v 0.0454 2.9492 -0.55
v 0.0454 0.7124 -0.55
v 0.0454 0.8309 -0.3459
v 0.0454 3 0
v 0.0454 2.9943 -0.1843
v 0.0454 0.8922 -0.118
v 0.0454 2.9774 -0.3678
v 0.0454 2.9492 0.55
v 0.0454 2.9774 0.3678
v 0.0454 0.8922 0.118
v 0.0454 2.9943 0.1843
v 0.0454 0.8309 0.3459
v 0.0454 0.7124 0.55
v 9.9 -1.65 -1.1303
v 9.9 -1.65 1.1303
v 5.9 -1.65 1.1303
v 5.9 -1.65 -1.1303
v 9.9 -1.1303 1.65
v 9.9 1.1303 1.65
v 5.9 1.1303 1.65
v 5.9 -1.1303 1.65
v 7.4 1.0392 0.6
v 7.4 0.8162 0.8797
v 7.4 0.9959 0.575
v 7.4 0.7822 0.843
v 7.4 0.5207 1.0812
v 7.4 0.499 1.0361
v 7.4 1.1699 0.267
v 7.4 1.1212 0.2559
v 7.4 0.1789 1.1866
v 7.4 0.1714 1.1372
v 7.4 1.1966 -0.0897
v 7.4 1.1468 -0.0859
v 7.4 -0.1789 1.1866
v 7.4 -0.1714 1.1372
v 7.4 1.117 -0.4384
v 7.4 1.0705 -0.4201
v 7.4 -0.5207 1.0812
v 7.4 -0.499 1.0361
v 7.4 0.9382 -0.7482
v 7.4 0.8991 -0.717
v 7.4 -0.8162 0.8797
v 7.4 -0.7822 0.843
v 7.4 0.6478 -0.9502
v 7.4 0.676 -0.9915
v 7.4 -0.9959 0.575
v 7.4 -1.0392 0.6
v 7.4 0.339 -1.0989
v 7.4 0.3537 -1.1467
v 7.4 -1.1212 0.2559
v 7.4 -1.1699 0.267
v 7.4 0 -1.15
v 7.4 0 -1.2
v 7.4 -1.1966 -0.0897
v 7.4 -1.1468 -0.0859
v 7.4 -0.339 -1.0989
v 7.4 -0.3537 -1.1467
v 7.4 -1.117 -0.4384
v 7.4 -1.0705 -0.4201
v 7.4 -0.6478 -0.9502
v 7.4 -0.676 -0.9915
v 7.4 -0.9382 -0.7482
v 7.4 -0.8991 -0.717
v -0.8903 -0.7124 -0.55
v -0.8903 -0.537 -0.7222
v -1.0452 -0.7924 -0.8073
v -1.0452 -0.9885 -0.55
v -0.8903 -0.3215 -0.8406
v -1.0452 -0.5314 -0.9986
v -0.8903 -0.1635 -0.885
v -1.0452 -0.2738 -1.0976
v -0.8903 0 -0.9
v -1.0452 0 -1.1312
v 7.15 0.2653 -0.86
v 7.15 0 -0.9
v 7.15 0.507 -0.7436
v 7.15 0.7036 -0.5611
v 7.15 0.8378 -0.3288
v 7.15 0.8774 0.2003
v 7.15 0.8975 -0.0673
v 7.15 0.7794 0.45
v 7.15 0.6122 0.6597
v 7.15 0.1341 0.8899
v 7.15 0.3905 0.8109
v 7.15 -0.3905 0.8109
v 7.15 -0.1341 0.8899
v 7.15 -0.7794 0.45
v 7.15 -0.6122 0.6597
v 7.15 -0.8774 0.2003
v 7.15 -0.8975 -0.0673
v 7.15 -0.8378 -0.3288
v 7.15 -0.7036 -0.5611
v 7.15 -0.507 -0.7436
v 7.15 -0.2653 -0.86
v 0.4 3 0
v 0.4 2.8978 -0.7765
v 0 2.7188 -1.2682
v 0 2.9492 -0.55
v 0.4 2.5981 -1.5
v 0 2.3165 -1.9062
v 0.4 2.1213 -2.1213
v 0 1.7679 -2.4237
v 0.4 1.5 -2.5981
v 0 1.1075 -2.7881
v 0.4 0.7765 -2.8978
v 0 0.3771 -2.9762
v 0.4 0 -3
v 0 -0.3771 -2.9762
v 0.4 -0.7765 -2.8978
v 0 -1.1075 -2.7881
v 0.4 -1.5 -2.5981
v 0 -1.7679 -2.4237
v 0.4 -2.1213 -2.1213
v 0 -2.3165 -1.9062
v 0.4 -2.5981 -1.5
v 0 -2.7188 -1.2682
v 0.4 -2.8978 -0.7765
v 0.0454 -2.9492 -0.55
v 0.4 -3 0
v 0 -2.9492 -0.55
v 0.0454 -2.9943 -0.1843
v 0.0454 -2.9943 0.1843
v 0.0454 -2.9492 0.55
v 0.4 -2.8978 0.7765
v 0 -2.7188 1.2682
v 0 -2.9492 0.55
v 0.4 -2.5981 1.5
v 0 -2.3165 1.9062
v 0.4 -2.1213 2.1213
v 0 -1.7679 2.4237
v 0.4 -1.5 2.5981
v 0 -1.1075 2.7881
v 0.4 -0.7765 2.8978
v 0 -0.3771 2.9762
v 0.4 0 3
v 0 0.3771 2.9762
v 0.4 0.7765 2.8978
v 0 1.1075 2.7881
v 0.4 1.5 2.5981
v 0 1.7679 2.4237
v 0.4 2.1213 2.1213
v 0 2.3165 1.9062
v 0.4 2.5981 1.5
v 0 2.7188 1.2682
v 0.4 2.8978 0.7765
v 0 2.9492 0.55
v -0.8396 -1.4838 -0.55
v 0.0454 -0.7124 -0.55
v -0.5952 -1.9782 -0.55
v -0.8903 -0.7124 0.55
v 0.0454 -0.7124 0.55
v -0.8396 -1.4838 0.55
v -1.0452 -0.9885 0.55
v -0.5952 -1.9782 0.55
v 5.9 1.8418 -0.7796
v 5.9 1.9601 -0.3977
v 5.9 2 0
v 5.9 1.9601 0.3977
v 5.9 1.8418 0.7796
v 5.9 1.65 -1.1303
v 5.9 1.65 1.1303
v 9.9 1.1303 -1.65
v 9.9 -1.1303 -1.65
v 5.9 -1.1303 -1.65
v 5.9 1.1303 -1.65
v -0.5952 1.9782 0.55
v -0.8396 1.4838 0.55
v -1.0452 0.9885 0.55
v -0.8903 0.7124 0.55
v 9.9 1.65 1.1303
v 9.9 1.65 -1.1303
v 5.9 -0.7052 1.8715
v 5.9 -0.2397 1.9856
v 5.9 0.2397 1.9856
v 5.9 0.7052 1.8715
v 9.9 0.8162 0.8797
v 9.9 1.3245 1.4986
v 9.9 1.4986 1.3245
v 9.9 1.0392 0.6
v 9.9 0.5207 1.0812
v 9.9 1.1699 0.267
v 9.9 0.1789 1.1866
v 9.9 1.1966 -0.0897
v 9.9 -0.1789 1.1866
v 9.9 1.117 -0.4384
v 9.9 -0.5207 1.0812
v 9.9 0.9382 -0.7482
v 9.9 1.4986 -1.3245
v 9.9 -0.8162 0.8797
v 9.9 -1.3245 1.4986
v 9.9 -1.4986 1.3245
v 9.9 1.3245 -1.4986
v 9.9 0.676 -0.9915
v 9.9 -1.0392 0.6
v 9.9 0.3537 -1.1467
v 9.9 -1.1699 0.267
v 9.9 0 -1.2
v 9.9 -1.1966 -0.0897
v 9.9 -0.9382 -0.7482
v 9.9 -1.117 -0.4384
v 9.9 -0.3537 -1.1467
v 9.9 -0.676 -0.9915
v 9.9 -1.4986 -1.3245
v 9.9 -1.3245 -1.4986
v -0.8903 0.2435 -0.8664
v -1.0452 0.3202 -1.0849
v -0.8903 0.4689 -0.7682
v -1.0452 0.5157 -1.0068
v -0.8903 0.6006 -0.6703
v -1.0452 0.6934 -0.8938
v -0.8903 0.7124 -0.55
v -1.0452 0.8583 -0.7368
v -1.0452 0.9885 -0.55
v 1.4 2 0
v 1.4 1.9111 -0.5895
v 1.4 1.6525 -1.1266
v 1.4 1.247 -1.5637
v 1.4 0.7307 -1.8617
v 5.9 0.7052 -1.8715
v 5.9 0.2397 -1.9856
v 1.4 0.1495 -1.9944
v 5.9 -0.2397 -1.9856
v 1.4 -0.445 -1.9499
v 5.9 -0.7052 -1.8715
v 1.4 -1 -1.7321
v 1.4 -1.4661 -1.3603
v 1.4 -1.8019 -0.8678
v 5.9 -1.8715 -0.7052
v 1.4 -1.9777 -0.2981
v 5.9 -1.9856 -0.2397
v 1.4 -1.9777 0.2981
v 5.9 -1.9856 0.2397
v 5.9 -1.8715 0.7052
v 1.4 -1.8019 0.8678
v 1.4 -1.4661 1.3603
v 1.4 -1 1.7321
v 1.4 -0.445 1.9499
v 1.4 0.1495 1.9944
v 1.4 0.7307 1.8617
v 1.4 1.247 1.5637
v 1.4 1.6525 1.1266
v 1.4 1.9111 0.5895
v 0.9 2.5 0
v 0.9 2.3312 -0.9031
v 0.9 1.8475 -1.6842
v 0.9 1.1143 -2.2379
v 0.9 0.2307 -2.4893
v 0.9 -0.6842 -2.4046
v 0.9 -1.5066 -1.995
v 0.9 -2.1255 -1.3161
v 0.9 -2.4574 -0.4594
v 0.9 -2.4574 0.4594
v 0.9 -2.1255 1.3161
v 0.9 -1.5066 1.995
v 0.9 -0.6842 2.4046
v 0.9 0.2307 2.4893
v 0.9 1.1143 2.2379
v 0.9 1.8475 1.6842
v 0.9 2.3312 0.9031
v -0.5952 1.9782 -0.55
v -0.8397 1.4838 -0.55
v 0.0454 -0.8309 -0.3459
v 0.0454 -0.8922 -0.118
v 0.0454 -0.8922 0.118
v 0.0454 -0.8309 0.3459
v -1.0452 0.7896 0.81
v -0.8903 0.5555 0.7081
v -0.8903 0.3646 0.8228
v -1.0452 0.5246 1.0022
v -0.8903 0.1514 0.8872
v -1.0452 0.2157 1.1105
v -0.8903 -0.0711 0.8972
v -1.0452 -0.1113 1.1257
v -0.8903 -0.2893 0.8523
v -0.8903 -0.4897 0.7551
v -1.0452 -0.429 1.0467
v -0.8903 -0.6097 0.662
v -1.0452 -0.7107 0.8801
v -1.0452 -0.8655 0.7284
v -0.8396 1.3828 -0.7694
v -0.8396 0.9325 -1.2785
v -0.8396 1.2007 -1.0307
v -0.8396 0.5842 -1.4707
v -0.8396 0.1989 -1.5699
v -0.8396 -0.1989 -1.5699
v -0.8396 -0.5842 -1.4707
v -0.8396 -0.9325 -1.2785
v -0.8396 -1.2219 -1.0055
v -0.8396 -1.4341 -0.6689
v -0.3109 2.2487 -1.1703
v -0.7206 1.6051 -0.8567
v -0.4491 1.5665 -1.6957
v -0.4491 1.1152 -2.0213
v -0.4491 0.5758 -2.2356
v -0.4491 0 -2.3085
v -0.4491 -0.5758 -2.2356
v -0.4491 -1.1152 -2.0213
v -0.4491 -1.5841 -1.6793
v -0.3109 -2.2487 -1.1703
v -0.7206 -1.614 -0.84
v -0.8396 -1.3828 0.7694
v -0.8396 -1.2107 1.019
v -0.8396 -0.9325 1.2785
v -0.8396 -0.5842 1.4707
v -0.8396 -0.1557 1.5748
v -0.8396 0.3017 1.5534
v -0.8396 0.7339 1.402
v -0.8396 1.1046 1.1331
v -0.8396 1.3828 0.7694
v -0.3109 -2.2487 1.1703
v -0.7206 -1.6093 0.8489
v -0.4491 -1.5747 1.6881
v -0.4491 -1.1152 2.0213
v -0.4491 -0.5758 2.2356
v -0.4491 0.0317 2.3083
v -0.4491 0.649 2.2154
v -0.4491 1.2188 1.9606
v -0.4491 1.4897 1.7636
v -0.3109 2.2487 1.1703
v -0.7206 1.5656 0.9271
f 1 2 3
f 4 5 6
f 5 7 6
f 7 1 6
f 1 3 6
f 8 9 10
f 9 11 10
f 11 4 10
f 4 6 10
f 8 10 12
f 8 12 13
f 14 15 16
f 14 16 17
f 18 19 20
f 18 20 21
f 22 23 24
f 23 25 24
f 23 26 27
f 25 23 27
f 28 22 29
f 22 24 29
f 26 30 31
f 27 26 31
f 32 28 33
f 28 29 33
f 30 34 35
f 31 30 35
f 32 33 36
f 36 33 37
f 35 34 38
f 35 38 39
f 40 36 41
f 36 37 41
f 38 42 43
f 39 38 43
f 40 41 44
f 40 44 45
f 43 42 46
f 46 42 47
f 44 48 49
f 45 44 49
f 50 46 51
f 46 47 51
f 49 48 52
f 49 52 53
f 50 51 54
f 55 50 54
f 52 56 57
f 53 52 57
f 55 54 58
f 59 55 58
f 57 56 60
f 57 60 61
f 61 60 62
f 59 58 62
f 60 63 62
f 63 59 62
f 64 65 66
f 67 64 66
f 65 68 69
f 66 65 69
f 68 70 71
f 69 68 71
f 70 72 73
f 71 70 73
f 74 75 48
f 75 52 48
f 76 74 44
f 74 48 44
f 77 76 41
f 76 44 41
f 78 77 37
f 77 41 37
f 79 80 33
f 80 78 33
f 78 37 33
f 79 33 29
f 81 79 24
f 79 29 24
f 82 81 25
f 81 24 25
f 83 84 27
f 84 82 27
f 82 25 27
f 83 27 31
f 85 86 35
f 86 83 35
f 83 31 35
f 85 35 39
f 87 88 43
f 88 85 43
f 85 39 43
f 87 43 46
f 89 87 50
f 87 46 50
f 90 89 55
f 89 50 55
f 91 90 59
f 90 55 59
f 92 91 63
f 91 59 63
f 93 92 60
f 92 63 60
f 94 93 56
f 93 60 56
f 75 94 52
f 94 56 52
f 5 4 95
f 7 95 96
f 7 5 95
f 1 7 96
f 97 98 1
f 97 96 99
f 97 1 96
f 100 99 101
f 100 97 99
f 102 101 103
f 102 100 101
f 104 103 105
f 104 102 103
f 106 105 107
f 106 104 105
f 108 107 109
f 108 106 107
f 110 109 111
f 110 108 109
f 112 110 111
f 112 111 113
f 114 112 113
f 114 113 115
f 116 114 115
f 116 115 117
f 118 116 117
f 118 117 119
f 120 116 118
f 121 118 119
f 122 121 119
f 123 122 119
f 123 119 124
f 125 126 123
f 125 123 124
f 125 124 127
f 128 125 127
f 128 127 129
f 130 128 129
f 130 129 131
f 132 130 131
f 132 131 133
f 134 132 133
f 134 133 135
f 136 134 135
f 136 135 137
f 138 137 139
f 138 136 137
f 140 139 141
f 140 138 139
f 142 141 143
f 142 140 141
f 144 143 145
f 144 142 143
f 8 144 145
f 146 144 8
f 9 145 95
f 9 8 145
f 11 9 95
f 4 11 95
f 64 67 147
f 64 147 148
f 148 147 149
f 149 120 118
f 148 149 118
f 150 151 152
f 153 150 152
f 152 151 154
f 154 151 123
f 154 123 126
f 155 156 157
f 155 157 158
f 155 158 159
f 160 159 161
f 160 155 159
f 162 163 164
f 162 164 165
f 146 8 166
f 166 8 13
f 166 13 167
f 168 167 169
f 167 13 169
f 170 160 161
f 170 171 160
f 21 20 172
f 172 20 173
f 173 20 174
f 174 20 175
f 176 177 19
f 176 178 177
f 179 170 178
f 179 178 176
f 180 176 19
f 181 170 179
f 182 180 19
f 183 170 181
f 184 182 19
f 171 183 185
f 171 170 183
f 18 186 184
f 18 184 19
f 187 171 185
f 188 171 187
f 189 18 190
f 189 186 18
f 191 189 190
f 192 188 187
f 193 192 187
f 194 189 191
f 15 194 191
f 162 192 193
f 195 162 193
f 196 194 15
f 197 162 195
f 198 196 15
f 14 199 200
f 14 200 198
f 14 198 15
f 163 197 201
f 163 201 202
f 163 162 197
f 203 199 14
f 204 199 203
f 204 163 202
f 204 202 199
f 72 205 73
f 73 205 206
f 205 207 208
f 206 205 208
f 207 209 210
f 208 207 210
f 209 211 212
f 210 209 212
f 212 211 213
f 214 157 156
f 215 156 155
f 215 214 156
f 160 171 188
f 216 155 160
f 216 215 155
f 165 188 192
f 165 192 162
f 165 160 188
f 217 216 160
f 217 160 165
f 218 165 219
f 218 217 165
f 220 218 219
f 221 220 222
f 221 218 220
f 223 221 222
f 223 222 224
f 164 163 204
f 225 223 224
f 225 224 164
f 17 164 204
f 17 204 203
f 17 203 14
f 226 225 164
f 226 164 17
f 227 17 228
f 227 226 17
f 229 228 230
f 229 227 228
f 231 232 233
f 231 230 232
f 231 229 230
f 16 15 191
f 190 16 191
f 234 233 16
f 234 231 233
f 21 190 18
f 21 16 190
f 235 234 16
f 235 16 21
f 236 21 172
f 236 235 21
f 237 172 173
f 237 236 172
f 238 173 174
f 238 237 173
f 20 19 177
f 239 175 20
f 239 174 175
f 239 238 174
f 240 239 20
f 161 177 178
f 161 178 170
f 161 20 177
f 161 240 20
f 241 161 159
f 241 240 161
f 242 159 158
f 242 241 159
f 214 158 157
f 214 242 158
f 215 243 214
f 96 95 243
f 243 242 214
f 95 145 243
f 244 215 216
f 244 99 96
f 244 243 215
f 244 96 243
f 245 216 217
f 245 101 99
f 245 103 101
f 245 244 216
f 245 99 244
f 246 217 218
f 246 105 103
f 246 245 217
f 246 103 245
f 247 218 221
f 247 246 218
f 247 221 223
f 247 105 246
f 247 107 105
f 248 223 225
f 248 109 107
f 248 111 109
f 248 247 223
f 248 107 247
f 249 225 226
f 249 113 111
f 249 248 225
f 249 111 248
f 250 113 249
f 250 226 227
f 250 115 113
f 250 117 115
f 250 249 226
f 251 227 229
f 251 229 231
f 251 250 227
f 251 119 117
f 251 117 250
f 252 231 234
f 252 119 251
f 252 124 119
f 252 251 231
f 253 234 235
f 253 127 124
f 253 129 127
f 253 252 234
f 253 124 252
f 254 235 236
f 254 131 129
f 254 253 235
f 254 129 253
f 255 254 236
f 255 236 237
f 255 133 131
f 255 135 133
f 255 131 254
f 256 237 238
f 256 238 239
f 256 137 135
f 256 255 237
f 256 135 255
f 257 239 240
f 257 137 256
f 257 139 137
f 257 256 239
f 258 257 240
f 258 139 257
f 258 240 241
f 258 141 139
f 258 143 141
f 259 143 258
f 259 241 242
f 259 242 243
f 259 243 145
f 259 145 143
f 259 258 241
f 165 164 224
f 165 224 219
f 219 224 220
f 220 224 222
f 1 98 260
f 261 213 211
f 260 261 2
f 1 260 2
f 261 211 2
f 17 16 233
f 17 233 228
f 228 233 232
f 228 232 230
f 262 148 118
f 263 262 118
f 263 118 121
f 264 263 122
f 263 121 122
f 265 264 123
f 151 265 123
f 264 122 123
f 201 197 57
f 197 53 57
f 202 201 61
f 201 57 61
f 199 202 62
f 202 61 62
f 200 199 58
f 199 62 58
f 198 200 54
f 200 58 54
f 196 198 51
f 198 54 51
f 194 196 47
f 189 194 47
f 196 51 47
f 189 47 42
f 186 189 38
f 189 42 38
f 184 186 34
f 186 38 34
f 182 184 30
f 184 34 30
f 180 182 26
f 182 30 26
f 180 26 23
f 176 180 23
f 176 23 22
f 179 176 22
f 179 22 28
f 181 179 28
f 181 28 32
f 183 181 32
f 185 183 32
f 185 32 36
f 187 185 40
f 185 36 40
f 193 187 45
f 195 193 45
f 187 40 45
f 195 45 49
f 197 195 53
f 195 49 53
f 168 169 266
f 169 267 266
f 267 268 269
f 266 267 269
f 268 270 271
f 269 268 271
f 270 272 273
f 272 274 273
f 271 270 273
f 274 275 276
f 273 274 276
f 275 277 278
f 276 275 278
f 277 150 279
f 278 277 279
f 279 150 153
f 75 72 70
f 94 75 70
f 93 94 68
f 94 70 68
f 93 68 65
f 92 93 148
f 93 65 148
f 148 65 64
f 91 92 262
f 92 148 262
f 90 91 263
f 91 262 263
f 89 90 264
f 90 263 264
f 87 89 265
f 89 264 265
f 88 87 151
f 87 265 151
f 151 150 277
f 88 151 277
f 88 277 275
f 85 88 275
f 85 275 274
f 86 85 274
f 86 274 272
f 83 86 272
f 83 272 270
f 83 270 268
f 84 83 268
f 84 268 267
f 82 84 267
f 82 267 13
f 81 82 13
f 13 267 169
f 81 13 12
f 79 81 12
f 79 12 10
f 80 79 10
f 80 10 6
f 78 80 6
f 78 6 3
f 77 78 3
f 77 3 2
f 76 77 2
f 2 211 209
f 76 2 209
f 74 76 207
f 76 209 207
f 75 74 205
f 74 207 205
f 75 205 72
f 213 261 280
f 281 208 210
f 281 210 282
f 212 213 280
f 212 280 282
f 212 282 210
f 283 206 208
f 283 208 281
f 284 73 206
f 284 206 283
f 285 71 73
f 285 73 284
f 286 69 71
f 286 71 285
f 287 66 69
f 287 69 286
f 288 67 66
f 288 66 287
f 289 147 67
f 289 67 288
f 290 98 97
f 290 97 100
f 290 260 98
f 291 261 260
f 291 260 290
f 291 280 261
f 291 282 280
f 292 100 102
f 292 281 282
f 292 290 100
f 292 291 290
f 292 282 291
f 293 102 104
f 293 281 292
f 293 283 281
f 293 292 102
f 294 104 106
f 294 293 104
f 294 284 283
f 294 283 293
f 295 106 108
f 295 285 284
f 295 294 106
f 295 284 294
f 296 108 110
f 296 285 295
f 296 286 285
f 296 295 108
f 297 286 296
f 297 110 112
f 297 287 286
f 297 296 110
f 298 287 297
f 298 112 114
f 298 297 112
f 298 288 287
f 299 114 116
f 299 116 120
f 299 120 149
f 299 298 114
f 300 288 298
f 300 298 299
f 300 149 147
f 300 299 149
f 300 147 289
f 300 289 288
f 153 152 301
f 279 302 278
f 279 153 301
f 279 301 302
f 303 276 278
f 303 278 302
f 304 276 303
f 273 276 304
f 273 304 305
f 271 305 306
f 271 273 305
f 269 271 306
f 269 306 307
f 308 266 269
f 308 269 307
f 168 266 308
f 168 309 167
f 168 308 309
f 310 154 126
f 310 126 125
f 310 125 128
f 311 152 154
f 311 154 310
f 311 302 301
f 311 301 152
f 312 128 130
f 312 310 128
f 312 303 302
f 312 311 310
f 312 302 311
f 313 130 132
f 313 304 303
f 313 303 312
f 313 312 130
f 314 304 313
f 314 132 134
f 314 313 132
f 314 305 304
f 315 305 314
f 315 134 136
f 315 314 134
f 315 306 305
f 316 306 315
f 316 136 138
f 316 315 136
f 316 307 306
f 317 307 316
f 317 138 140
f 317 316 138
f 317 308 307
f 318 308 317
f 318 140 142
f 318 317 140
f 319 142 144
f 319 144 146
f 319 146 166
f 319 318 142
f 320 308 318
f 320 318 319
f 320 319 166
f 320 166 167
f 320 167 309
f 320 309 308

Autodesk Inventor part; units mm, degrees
ref_plane "YZ Plane" through (0, 0, 0) normal (1, 0, 0) x (0, 1, 0)
ref_plane "XZ Plane" through (0, 0, 0) normal (0, 1, 0) x (-1, 0, 0)
ref_plane "XY Plane" through (0, 0, 0) normal (0, 0, 1) x (1, 0, 0)
sketch "Szkic1" plane through (0, 0, 0) normal (0, 0, 1) x (1, 0, 0)
  line L0 (9.9, 0) -> (9.9, 2)
  line L1 (9.9, 2) -> (1.4, 2)
  line L2 (1.4, 2) -> (0.4, 3)
  line L3 (0.4, 3) -> (0, 3)
  arc A0 (0, 3) -> (-1.4487, 0) centre (8.1549, -2.7877) ccw
  line L4 (-1.1, 1) -> (9.9, 1) construction
  line L5 (-1.4487, 0) -> (0, 0)
  line L6 (9.9, 0) -> (0, 0)
  dimension "d1" = 11
  dimension "d2" = 1.1
  dimension "d3" = 10
  dimension "d9" = 2.5
  dimension "d10" = 45
  dimension "d11" = 1
  dimension "d12" = 3
revolve "Obrót1" add sketch "Szkic1" angle 360 about axis through (9.9, 0, 0) along (-1, 0, 0)
sketch "Szkic2" plane through (9.9, 0, 0) normal (1, 0, 0) x (0, 0, -1)
  circle A0 centre (0, 0) radius 2 projected
  line L0 (-1.1303, -1.65) -> (1.1303, -1.65)
  line L1 (1.65, -1.1303) -> (1.65, 1.1303)
  line L2 (1.1303, 1.65) -> (-1.1303, 1.65)
  line L3 (-1.65, 1.1303) -> (-1.65, -1.1303)
  line L4 (-1.65, -1.65) -> (1.65, 1.65) construction
  line L5 (1.65, -1.65) -> (-1.65, 1.65) construction
  dimension "d14" = 3.3
  dimension "d15" = 3.3
extrude "Wyciągnięcie proste2" cut sketch "Szkic2" against normal blind 4 contours A0 L1 | L2 A0 | A0 L0 | L3 A0
sketch "Szkic3" plane through (9.9, -1.1303, -1.65) normal (1, 0, 0) x (0, 0, -1)
  line L0 (-2.7803, -0.5197) -> (-0.5197, -0.5197) projected
  arc A0 (-0.5197, -0.5197) -> (0, 0) centre (-1.65, 1.1303) ccw projected
  line L1 (0, 0) -> (0, 2.2605) projected
  arc A1 (0, 2.2605) -> (-0.5197, 2.7803) centre (-1.65, 1.1303) ccw projected
  line L2 (-0.5197, 2.7803) -> (-2.7803, 2.7803) projected
  arc A2 (-2.7803, 2.7803) -> (-3.3, 2.2605) centre (-1.65, 1.1303) ccw projected
  line L3 (-3.3, 2.2605) -> (-3.3, 0) projected
  arc A3 (-3.3, 0) -> (-2.7803, -0.5197) centre (-1.65, 1.1303) ccw projected
hole "Otwór1" at (9.9, 0, 0) direction (-1, 0, 0) diameter 1.8 end through all counterbore diameter 2.4 counterbore depth 2.5
chamfer "Faza1" distance 0.25 angle 45 1 edges at (7.4, 0, 0.9)
chamfer "Faza2" distance 0.25 angle 45 2 edges at (-1.1403, -0.6363, 0.6365) (-1.1403, 0.6364, -0.6364)
sketch "Szkic5" plane through (0, 0, 0) normal (0, 1, 0) x (-1, 0, 0)
  line L0 (0, 3) -> (0, -3) construction
  line L1 (1.0546, -0.55) -> (-0.0454, -0.55)
  line L2 (-0.0454, -0.55) -> (-0.0454, 0.55)
  line L3 (-0.0454, 0.55) -> (1.0546, 0.55)
  line L4 (1.0546, 0.55) -> (1.0546, -0.55)
  line L5 (1.0546, -0.55) -> (-0.0454, 0.55) construction
  line L6 (-0.0454, -0.55) -> (1.0546, 0.55) construction
  point P0 (0, 0)
  point P1 (0.5046, 0)
  dimension "d33" = 1.1
  dimension "d34" = 1.1
extrude "Wyciągnięcie proste3" cut sketch "Szkic5" along normal through all both and the other way through all
thread "Gwint1" size "M2.5x0.45" class "6H" standard "ANSI Metric M Profile" full length
properties part number "Nypel_szprychy" material "Aluminium AW-7020"
